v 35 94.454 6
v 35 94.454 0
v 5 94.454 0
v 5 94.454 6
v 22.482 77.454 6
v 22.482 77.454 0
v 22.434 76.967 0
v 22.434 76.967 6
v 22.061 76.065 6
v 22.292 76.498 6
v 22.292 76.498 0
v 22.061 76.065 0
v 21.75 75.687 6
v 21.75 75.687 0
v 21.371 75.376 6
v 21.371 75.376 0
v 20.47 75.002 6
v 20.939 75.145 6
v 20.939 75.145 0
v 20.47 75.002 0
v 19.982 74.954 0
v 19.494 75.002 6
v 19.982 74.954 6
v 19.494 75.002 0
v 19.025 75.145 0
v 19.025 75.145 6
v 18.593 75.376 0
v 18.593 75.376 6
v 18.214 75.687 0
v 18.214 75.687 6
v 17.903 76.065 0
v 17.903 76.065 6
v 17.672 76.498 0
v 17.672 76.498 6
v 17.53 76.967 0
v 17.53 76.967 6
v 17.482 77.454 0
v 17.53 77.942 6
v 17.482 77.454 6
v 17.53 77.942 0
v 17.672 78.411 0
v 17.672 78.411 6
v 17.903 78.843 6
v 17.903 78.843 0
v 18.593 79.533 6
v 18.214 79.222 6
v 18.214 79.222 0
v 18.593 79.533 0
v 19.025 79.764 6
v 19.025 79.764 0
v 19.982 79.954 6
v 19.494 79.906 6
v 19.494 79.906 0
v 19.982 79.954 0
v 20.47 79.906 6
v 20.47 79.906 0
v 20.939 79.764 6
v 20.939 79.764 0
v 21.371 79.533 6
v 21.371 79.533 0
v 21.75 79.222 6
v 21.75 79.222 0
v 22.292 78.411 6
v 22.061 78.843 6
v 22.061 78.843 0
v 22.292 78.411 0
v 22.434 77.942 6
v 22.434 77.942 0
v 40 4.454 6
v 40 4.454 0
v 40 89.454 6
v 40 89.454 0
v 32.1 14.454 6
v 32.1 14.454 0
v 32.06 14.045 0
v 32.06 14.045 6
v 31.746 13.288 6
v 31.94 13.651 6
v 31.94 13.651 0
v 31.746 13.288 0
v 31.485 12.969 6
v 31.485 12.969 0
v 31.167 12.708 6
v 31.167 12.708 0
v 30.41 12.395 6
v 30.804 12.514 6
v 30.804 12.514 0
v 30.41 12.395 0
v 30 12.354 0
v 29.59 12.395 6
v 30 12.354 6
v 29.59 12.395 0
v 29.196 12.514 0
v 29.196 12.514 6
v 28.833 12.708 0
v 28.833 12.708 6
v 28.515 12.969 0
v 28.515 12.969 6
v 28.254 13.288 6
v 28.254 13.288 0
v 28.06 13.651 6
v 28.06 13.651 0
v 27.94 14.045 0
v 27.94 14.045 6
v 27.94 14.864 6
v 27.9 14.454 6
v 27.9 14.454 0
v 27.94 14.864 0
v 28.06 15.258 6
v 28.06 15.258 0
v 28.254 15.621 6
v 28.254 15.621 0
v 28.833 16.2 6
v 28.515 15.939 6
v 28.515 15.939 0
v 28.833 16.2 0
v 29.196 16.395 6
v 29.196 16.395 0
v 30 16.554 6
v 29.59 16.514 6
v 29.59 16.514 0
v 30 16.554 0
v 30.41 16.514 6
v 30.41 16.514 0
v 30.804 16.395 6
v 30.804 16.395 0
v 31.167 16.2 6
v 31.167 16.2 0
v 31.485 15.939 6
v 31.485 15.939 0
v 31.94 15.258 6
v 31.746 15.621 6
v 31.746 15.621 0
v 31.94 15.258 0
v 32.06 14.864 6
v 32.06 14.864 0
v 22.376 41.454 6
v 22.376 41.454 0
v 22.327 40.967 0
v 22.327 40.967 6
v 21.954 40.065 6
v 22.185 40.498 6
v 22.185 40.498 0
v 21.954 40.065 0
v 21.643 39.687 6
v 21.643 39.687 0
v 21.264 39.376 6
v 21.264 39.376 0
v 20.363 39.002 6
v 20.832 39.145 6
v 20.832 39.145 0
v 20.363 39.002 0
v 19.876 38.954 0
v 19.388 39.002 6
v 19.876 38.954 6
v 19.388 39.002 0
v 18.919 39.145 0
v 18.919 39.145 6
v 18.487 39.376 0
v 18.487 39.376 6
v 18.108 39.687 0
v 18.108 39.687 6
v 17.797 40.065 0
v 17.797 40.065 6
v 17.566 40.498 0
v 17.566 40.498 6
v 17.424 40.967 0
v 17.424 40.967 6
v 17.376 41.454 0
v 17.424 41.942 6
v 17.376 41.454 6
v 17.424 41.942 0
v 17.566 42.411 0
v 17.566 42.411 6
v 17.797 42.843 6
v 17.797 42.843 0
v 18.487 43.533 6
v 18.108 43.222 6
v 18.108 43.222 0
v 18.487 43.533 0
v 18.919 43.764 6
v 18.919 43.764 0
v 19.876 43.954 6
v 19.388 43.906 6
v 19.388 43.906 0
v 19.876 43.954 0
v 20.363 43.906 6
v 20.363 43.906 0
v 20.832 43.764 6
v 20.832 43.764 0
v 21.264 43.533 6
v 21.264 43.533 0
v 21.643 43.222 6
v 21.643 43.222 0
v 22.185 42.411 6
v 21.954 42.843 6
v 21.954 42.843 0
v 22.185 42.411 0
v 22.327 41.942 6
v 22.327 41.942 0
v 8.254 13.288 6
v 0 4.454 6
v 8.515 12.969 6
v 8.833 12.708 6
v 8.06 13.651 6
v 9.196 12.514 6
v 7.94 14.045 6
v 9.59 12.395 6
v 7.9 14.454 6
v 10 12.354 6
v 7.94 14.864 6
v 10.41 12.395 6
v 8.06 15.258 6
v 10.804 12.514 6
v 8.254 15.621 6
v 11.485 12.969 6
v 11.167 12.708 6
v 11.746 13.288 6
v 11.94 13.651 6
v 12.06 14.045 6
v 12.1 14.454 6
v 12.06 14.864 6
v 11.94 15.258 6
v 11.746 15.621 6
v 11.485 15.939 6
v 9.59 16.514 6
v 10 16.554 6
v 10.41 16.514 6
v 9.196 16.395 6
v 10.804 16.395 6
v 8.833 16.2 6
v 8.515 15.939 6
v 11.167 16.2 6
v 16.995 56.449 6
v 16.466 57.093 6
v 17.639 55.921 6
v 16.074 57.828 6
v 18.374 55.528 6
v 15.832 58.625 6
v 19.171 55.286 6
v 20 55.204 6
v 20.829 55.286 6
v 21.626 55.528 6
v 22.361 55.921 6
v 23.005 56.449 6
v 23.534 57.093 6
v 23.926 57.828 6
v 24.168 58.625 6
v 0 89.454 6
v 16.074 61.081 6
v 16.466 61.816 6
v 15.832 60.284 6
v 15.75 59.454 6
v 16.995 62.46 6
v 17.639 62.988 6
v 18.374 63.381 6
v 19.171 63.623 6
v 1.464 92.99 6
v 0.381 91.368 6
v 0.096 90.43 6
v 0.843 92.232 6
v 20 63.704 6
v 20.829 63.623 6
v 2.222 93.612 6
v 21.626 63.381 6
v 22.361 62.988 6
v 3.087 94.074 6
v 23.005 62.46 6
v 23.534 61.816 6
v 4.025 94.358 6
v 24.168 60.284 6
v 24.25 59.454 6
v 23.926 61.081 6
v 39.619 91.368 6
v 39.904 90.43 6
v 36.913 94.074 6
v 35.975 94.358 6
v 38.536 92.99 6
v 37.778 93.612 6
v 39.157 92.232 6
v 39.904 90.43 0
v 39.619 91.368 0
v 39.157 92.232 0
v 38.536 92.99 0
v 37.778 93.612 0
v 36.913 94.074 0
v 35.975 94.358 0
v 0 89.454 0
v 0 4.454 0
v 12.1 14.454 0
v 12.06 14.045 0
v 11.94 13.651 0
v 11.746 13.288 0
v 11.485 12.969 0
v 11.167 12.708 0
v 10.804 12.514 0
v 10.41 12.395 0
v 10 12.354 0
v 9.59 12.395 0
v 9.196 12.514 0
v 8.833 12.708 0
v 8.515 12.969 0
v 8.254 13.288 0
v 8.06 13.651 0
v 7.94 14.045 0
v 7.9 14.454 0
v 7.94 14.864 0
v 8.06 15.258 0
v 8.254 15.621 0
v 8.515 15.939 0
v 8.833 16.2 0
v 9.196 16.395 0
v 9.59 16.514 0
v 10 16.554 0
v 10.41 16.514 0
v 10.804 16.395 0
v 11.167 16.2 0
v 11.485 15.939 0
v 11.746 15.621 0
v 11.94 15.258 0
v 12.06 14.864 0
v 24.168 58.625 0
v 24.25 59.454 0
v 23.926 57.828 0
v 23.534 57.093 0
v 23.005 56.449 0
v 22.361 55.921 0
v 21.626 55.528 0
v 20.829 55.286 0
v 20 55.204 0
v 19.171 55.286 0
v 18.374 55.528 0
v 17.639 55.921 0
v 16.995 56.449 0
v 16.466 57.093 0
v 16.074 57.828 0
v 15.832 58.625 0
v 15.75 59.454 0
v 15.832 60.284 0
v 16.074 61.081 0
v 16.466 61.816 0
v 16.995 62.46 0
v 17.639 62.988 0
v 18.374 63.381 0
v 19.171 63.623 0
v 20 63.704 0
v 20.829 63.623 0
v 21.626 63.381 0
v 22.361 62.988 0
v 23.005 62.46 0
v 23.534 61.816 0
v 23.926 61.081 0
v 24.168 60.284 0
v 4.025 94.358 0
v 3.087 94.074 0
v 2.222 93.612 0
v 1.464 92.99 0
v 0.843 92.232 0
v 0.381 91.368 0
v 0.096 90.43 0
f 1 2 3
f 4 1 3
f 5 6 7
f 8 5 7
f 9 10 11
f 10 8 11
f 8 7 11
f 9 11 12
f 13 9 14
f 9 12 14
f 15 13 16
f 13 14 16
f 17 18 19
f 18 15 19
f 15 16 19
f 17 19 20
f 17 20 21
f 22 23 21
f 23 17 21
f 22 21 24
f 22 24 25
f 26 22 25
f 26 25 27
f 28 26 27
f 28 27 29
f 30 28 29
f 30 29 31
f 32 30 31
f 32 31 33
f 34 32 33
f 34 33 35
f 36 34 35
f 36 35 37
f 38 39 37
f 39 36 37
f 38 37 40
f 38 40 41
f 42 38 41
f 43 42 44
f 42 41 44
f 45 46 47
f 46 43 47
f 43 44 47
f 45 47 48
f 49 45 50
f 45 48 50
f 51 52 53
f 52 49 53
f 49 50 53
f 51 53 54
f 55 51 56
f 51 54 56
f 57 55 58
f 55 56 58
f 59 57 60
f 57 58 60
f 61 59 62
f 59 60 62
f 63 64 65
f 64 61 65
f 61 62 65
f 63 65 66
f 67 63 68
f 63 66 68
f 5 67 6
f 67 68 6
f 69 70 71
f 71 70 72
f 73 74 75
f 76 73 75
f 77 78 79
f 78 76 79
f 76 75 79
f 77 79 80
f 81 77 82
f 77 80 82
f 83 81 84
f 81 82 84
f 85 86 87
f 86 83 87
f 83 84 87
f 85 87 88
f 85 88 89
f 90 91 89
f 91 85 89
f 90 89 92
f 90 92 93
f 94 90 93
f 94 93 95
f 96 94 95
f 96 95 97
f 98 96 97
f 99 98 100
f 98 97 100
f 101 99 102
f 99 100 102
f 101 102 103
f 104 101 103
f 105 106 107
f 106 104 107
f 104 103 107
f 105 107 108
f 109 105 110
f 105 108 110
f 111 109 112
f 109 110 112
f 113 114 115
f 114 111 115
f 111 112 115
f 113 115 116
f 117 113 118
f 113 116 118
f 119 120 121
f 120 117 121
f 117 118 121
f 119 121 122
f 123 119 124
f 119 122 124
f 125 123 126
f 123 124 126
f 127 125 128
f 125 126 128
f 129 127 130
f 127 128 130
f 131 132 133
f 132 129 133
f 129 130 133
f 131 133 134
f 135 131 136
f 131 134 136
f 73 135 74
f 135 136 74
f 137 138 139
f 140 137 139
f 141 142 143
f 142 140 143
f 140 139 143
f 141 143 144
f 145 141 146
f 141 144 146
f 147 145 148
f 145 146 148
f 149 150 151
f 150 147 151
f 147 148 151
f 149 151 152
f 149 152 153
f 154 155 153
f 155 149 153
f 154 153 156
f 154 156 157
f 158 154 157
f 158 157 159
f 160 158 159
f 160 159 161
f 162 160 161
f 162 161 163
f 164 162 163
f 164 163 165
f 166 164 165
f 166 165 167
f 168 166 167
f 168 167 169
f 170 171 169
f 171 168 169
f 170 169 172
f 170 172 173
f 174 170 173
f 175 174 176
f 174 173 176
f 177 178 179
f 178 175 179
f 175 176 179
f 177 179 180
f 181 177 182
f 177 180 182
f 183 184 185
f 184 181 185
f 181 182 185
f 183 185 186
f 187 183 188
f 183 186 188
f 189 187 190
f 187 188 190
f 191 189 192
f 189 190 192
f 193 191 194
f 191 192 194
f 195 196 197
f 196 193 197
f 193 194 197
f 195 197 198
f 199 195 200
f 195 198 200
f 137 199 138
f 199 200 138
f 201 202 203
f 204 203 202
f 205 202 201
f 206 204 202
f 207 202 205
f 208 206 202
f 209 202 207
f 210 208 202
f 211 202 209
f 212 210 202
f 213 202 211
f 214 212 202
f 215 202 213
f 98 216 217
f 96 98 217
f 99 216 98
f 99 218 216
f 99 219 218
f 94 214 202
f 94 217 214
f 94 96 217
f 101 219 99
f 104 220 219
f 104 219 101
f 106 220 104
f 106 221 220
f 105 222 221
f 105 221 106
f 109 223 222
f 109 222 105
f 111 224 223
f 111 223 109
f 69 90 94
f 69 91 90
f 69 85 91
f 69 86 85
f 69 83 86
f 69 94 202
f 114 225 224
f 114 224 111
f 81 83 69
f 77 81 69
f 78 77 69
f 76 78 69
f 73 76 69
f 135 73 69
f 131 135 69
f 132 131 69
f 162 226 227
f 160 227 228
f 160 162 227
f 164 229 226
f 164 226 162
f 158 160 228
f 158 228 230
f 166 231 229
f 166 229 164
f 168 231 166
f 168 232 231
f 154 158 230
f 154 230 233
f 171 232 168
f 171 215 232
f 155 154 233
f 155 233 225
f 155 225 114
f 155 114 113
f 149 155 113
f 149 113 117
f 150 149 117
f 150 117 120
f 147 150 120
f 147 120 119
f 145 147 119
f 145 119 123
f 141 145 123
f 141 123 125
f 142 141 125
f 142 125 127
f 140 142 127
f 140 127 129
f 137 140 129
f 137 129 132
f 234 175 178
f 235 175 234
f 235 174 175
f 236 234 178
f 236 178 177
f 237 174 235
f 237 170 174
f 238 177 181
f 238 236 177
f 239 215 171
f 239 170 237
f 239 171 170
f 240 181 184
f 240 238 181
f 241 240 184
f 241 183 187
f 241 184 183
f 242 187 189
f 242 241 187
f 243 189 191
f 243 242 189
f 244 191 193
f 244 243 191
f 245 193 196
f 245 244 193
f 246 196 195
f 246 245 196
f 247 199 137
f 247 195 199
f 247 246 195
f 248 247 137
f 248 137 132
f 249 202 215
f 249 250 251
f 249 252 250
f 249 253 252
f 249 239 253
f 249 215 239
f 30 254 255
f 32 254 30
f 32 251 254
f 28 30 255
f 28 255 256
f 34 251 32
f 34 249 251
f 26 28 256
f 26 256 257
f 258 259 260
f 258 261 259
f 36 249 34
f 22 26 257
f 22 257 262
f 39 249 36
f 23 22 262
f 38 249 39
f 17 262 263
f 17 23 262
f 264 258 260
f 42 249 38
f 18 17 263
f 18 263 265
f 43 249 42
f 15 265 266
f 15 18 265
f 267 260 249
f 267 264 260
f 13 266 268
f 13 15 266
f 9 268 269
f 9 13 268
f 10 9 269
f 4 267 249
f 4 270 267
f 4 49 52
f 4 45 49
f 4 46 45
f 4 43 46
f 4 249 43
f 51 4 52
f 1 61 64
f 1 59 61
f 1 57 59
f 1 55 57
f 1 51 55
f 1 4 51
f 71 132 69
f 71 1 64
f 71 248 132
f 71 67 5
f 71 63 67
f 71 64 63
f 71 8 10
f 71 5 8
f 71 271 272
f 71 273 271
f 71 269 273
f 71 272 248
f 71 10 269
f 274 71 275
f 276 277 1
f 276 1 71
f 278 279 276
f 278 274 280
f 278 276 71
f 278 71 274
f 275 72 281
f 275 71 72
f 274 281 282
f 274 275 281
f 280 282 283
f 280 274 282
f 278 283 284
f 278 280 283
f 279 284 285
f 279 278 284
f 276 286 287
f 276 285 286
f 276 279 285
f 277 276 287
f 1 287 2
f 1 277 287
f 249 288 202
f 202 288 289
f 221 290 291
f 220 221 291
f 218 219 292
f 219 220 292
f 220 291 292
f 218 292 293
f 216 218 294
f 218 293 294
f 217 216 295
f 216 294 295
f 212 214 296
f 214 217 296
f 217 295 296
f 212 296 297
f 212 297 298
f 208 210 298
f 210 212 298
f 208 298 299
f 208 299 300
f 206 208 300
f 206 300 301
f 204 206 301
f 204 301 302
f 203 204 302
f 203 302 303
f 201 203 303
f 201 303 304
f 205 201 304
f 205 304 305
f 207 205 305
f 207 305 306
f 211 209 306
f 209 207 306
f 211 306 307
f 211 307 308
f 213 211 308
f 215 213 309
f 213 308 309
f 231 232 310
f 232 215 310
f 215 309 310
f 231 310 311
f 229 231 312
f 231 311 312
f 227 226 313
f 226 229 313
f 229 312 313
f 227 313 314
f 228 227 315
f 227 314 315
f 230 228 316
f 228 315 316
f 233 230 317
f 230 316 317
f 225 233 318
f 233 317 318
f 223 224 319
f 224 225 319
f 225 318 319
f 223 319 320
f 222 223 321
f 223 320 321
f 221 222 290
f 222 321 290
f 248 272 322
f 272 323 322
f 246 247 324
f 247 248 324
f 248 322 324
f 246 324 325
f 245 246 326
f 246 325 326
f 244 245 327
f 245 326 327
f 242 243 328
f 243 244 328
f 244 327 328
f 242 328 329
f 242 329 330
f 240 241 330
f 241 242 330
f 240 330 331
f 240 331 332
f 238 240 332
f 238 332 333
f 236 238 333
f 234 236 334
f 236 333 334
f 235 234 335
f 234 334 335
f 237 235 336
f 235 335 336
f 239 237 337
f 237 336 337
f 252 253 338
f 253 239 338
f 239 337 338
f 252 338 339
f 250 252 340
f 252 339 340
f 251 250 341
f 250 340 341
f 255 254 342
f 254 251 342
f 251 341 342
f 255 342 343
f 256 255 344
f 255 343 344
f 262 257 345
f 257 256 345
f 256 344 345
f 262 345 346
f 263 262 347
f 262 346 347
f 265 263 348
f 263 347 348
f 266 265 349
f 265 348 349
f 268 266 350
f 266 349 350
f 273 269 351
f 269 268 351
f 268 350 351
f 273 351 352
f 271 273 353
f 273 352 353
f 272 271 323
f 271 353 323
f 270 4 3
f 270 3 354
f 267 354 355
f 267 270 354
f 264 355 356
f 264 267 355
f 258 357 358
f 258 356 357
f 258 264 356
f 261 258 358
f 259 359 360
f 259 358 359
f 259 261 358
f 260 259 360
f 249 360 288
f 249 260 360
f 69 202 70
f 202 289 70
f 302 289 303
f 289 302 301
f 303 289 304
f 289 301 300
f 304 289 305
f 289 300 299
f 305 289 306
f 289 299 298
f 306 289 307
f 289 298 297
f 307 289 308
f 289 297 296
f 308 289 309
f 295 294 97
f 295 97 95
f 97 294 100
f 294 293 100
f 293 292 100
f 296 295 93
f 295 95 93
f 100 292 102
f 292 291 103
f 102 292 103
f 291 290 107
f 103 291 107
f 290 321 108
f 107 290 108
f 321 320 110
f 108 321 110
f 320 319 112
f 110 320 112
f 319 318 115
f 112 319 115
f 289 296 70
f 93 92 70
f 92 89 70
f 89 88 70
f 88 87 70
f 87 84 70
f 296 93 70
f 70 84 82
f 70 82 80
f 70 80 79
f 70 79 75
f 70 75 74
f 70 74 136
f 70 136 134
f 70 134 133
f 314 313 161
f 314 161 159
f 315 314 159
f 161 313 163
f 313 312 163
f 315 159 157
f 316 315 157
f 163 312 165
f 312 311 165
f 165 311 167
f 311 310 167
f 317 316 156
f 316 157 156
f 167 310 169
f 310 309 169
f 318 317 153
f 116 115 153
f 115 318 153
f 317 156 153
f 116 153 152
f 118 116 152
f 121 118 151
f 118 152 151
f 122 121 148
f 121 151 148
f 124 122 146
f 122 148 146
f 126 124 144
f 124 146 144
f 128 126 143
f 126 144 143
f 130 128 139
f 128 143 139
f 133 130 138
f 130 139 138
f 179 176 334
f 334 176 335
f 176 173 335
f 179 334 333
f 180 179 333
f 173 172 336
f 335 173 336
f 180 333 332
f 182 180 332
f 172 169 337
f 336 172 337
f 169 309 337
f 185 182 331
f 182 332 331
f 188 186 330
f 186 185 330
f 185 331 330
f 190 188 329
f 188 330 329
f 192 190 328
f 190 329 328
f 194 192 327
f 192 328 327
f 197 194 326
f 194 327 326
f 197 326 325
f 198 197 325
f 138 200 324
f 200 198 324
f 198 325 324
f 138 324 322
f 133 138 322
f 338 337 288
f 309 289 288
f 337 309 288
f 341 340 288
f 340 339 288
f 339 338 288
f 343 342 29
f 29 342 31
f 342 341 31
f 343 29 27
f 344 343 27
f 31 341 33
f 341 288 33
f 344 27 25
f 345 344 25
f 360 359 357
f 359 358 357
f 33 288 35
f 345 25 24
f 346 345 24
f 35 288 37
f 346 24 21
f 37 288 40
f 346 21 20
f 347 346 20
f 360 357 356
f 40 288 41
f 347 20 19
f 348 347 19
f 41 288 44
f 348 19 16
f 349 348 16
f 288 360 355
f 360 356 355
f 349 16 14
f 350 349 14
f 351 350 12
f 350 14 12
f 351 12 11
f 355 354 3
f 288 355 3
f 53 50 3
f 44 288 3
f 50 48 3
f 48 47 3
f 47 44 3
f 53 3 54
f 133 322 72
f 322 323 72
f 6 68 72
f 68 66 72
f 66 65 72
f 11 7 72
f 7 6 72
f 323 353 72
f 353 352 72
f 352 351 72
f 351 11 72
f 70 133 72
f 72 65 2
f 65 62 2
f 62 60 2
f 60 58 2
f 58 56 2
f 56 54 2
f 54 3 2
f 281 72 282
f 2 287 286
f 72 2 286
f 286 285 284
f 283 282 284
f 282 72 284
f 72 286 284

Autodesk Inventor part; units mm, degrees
ref_plane "YZ Plane" through (0, 0, 0) normal (1, 0, 0) x (0, 1, 0)
ref_plane "XZ Plane" through (0, 0, 0) normal (0, 1, 0) x (-1, 0, 0)
ref_plane "XY Plane" through (0, 0, 0) normal (0, 0, 1) x (1, 0, 0)
sketch "Sketch1" plane through (0, 0, 0) normal (0, 0, 1) x (1, 0, 0)
  line L0 (40, 4.4544) -> (40, 94.4544)
  line L1 (40, 94.4544) -> (0, 94.4544)
  line L2 (0, 94.4544) -> (0, 4.4544)
  circle A0 centre (20, 59.4544) radius 4.25
  circle A1 centre (10, 14.4544) radius 2.1
  circle A2 centre (30, 14.4544) radius 2.1
  circle A3 centre (19.982, 77.4544) radius 2.5
  circle A4 centre (19.8755, 41.4544) radius 2.5
  line L3 (0, 4.4544) -> (40, 4.4544)
  point P0 (0, 0)
  dimension "d4" = 40
  dimension "d5" = 90
  dimension "d7" = 8.5
  dimension "d8" = 35
  dimension "d9" = 20
  dimension "d11" = 90
  dimension "d19" = 10
  dimension "d21" = 4.2
  dimension "d22" = 10
  dimension "d24" = 4.2
extrude "Extrusion1" add sketch "Sketch1" along normal blind 6
fillet "Fillet1" radius 5 2 edges at (0, 94.4544, 3) (40, 94.4544, 3)
equation "\"d9\" = 0.5 * d4"
equation "\"d22\" = d19"
equation "\"d24\" = d21"
properties part number "BaseC_5" material "PMMA Plastic"
